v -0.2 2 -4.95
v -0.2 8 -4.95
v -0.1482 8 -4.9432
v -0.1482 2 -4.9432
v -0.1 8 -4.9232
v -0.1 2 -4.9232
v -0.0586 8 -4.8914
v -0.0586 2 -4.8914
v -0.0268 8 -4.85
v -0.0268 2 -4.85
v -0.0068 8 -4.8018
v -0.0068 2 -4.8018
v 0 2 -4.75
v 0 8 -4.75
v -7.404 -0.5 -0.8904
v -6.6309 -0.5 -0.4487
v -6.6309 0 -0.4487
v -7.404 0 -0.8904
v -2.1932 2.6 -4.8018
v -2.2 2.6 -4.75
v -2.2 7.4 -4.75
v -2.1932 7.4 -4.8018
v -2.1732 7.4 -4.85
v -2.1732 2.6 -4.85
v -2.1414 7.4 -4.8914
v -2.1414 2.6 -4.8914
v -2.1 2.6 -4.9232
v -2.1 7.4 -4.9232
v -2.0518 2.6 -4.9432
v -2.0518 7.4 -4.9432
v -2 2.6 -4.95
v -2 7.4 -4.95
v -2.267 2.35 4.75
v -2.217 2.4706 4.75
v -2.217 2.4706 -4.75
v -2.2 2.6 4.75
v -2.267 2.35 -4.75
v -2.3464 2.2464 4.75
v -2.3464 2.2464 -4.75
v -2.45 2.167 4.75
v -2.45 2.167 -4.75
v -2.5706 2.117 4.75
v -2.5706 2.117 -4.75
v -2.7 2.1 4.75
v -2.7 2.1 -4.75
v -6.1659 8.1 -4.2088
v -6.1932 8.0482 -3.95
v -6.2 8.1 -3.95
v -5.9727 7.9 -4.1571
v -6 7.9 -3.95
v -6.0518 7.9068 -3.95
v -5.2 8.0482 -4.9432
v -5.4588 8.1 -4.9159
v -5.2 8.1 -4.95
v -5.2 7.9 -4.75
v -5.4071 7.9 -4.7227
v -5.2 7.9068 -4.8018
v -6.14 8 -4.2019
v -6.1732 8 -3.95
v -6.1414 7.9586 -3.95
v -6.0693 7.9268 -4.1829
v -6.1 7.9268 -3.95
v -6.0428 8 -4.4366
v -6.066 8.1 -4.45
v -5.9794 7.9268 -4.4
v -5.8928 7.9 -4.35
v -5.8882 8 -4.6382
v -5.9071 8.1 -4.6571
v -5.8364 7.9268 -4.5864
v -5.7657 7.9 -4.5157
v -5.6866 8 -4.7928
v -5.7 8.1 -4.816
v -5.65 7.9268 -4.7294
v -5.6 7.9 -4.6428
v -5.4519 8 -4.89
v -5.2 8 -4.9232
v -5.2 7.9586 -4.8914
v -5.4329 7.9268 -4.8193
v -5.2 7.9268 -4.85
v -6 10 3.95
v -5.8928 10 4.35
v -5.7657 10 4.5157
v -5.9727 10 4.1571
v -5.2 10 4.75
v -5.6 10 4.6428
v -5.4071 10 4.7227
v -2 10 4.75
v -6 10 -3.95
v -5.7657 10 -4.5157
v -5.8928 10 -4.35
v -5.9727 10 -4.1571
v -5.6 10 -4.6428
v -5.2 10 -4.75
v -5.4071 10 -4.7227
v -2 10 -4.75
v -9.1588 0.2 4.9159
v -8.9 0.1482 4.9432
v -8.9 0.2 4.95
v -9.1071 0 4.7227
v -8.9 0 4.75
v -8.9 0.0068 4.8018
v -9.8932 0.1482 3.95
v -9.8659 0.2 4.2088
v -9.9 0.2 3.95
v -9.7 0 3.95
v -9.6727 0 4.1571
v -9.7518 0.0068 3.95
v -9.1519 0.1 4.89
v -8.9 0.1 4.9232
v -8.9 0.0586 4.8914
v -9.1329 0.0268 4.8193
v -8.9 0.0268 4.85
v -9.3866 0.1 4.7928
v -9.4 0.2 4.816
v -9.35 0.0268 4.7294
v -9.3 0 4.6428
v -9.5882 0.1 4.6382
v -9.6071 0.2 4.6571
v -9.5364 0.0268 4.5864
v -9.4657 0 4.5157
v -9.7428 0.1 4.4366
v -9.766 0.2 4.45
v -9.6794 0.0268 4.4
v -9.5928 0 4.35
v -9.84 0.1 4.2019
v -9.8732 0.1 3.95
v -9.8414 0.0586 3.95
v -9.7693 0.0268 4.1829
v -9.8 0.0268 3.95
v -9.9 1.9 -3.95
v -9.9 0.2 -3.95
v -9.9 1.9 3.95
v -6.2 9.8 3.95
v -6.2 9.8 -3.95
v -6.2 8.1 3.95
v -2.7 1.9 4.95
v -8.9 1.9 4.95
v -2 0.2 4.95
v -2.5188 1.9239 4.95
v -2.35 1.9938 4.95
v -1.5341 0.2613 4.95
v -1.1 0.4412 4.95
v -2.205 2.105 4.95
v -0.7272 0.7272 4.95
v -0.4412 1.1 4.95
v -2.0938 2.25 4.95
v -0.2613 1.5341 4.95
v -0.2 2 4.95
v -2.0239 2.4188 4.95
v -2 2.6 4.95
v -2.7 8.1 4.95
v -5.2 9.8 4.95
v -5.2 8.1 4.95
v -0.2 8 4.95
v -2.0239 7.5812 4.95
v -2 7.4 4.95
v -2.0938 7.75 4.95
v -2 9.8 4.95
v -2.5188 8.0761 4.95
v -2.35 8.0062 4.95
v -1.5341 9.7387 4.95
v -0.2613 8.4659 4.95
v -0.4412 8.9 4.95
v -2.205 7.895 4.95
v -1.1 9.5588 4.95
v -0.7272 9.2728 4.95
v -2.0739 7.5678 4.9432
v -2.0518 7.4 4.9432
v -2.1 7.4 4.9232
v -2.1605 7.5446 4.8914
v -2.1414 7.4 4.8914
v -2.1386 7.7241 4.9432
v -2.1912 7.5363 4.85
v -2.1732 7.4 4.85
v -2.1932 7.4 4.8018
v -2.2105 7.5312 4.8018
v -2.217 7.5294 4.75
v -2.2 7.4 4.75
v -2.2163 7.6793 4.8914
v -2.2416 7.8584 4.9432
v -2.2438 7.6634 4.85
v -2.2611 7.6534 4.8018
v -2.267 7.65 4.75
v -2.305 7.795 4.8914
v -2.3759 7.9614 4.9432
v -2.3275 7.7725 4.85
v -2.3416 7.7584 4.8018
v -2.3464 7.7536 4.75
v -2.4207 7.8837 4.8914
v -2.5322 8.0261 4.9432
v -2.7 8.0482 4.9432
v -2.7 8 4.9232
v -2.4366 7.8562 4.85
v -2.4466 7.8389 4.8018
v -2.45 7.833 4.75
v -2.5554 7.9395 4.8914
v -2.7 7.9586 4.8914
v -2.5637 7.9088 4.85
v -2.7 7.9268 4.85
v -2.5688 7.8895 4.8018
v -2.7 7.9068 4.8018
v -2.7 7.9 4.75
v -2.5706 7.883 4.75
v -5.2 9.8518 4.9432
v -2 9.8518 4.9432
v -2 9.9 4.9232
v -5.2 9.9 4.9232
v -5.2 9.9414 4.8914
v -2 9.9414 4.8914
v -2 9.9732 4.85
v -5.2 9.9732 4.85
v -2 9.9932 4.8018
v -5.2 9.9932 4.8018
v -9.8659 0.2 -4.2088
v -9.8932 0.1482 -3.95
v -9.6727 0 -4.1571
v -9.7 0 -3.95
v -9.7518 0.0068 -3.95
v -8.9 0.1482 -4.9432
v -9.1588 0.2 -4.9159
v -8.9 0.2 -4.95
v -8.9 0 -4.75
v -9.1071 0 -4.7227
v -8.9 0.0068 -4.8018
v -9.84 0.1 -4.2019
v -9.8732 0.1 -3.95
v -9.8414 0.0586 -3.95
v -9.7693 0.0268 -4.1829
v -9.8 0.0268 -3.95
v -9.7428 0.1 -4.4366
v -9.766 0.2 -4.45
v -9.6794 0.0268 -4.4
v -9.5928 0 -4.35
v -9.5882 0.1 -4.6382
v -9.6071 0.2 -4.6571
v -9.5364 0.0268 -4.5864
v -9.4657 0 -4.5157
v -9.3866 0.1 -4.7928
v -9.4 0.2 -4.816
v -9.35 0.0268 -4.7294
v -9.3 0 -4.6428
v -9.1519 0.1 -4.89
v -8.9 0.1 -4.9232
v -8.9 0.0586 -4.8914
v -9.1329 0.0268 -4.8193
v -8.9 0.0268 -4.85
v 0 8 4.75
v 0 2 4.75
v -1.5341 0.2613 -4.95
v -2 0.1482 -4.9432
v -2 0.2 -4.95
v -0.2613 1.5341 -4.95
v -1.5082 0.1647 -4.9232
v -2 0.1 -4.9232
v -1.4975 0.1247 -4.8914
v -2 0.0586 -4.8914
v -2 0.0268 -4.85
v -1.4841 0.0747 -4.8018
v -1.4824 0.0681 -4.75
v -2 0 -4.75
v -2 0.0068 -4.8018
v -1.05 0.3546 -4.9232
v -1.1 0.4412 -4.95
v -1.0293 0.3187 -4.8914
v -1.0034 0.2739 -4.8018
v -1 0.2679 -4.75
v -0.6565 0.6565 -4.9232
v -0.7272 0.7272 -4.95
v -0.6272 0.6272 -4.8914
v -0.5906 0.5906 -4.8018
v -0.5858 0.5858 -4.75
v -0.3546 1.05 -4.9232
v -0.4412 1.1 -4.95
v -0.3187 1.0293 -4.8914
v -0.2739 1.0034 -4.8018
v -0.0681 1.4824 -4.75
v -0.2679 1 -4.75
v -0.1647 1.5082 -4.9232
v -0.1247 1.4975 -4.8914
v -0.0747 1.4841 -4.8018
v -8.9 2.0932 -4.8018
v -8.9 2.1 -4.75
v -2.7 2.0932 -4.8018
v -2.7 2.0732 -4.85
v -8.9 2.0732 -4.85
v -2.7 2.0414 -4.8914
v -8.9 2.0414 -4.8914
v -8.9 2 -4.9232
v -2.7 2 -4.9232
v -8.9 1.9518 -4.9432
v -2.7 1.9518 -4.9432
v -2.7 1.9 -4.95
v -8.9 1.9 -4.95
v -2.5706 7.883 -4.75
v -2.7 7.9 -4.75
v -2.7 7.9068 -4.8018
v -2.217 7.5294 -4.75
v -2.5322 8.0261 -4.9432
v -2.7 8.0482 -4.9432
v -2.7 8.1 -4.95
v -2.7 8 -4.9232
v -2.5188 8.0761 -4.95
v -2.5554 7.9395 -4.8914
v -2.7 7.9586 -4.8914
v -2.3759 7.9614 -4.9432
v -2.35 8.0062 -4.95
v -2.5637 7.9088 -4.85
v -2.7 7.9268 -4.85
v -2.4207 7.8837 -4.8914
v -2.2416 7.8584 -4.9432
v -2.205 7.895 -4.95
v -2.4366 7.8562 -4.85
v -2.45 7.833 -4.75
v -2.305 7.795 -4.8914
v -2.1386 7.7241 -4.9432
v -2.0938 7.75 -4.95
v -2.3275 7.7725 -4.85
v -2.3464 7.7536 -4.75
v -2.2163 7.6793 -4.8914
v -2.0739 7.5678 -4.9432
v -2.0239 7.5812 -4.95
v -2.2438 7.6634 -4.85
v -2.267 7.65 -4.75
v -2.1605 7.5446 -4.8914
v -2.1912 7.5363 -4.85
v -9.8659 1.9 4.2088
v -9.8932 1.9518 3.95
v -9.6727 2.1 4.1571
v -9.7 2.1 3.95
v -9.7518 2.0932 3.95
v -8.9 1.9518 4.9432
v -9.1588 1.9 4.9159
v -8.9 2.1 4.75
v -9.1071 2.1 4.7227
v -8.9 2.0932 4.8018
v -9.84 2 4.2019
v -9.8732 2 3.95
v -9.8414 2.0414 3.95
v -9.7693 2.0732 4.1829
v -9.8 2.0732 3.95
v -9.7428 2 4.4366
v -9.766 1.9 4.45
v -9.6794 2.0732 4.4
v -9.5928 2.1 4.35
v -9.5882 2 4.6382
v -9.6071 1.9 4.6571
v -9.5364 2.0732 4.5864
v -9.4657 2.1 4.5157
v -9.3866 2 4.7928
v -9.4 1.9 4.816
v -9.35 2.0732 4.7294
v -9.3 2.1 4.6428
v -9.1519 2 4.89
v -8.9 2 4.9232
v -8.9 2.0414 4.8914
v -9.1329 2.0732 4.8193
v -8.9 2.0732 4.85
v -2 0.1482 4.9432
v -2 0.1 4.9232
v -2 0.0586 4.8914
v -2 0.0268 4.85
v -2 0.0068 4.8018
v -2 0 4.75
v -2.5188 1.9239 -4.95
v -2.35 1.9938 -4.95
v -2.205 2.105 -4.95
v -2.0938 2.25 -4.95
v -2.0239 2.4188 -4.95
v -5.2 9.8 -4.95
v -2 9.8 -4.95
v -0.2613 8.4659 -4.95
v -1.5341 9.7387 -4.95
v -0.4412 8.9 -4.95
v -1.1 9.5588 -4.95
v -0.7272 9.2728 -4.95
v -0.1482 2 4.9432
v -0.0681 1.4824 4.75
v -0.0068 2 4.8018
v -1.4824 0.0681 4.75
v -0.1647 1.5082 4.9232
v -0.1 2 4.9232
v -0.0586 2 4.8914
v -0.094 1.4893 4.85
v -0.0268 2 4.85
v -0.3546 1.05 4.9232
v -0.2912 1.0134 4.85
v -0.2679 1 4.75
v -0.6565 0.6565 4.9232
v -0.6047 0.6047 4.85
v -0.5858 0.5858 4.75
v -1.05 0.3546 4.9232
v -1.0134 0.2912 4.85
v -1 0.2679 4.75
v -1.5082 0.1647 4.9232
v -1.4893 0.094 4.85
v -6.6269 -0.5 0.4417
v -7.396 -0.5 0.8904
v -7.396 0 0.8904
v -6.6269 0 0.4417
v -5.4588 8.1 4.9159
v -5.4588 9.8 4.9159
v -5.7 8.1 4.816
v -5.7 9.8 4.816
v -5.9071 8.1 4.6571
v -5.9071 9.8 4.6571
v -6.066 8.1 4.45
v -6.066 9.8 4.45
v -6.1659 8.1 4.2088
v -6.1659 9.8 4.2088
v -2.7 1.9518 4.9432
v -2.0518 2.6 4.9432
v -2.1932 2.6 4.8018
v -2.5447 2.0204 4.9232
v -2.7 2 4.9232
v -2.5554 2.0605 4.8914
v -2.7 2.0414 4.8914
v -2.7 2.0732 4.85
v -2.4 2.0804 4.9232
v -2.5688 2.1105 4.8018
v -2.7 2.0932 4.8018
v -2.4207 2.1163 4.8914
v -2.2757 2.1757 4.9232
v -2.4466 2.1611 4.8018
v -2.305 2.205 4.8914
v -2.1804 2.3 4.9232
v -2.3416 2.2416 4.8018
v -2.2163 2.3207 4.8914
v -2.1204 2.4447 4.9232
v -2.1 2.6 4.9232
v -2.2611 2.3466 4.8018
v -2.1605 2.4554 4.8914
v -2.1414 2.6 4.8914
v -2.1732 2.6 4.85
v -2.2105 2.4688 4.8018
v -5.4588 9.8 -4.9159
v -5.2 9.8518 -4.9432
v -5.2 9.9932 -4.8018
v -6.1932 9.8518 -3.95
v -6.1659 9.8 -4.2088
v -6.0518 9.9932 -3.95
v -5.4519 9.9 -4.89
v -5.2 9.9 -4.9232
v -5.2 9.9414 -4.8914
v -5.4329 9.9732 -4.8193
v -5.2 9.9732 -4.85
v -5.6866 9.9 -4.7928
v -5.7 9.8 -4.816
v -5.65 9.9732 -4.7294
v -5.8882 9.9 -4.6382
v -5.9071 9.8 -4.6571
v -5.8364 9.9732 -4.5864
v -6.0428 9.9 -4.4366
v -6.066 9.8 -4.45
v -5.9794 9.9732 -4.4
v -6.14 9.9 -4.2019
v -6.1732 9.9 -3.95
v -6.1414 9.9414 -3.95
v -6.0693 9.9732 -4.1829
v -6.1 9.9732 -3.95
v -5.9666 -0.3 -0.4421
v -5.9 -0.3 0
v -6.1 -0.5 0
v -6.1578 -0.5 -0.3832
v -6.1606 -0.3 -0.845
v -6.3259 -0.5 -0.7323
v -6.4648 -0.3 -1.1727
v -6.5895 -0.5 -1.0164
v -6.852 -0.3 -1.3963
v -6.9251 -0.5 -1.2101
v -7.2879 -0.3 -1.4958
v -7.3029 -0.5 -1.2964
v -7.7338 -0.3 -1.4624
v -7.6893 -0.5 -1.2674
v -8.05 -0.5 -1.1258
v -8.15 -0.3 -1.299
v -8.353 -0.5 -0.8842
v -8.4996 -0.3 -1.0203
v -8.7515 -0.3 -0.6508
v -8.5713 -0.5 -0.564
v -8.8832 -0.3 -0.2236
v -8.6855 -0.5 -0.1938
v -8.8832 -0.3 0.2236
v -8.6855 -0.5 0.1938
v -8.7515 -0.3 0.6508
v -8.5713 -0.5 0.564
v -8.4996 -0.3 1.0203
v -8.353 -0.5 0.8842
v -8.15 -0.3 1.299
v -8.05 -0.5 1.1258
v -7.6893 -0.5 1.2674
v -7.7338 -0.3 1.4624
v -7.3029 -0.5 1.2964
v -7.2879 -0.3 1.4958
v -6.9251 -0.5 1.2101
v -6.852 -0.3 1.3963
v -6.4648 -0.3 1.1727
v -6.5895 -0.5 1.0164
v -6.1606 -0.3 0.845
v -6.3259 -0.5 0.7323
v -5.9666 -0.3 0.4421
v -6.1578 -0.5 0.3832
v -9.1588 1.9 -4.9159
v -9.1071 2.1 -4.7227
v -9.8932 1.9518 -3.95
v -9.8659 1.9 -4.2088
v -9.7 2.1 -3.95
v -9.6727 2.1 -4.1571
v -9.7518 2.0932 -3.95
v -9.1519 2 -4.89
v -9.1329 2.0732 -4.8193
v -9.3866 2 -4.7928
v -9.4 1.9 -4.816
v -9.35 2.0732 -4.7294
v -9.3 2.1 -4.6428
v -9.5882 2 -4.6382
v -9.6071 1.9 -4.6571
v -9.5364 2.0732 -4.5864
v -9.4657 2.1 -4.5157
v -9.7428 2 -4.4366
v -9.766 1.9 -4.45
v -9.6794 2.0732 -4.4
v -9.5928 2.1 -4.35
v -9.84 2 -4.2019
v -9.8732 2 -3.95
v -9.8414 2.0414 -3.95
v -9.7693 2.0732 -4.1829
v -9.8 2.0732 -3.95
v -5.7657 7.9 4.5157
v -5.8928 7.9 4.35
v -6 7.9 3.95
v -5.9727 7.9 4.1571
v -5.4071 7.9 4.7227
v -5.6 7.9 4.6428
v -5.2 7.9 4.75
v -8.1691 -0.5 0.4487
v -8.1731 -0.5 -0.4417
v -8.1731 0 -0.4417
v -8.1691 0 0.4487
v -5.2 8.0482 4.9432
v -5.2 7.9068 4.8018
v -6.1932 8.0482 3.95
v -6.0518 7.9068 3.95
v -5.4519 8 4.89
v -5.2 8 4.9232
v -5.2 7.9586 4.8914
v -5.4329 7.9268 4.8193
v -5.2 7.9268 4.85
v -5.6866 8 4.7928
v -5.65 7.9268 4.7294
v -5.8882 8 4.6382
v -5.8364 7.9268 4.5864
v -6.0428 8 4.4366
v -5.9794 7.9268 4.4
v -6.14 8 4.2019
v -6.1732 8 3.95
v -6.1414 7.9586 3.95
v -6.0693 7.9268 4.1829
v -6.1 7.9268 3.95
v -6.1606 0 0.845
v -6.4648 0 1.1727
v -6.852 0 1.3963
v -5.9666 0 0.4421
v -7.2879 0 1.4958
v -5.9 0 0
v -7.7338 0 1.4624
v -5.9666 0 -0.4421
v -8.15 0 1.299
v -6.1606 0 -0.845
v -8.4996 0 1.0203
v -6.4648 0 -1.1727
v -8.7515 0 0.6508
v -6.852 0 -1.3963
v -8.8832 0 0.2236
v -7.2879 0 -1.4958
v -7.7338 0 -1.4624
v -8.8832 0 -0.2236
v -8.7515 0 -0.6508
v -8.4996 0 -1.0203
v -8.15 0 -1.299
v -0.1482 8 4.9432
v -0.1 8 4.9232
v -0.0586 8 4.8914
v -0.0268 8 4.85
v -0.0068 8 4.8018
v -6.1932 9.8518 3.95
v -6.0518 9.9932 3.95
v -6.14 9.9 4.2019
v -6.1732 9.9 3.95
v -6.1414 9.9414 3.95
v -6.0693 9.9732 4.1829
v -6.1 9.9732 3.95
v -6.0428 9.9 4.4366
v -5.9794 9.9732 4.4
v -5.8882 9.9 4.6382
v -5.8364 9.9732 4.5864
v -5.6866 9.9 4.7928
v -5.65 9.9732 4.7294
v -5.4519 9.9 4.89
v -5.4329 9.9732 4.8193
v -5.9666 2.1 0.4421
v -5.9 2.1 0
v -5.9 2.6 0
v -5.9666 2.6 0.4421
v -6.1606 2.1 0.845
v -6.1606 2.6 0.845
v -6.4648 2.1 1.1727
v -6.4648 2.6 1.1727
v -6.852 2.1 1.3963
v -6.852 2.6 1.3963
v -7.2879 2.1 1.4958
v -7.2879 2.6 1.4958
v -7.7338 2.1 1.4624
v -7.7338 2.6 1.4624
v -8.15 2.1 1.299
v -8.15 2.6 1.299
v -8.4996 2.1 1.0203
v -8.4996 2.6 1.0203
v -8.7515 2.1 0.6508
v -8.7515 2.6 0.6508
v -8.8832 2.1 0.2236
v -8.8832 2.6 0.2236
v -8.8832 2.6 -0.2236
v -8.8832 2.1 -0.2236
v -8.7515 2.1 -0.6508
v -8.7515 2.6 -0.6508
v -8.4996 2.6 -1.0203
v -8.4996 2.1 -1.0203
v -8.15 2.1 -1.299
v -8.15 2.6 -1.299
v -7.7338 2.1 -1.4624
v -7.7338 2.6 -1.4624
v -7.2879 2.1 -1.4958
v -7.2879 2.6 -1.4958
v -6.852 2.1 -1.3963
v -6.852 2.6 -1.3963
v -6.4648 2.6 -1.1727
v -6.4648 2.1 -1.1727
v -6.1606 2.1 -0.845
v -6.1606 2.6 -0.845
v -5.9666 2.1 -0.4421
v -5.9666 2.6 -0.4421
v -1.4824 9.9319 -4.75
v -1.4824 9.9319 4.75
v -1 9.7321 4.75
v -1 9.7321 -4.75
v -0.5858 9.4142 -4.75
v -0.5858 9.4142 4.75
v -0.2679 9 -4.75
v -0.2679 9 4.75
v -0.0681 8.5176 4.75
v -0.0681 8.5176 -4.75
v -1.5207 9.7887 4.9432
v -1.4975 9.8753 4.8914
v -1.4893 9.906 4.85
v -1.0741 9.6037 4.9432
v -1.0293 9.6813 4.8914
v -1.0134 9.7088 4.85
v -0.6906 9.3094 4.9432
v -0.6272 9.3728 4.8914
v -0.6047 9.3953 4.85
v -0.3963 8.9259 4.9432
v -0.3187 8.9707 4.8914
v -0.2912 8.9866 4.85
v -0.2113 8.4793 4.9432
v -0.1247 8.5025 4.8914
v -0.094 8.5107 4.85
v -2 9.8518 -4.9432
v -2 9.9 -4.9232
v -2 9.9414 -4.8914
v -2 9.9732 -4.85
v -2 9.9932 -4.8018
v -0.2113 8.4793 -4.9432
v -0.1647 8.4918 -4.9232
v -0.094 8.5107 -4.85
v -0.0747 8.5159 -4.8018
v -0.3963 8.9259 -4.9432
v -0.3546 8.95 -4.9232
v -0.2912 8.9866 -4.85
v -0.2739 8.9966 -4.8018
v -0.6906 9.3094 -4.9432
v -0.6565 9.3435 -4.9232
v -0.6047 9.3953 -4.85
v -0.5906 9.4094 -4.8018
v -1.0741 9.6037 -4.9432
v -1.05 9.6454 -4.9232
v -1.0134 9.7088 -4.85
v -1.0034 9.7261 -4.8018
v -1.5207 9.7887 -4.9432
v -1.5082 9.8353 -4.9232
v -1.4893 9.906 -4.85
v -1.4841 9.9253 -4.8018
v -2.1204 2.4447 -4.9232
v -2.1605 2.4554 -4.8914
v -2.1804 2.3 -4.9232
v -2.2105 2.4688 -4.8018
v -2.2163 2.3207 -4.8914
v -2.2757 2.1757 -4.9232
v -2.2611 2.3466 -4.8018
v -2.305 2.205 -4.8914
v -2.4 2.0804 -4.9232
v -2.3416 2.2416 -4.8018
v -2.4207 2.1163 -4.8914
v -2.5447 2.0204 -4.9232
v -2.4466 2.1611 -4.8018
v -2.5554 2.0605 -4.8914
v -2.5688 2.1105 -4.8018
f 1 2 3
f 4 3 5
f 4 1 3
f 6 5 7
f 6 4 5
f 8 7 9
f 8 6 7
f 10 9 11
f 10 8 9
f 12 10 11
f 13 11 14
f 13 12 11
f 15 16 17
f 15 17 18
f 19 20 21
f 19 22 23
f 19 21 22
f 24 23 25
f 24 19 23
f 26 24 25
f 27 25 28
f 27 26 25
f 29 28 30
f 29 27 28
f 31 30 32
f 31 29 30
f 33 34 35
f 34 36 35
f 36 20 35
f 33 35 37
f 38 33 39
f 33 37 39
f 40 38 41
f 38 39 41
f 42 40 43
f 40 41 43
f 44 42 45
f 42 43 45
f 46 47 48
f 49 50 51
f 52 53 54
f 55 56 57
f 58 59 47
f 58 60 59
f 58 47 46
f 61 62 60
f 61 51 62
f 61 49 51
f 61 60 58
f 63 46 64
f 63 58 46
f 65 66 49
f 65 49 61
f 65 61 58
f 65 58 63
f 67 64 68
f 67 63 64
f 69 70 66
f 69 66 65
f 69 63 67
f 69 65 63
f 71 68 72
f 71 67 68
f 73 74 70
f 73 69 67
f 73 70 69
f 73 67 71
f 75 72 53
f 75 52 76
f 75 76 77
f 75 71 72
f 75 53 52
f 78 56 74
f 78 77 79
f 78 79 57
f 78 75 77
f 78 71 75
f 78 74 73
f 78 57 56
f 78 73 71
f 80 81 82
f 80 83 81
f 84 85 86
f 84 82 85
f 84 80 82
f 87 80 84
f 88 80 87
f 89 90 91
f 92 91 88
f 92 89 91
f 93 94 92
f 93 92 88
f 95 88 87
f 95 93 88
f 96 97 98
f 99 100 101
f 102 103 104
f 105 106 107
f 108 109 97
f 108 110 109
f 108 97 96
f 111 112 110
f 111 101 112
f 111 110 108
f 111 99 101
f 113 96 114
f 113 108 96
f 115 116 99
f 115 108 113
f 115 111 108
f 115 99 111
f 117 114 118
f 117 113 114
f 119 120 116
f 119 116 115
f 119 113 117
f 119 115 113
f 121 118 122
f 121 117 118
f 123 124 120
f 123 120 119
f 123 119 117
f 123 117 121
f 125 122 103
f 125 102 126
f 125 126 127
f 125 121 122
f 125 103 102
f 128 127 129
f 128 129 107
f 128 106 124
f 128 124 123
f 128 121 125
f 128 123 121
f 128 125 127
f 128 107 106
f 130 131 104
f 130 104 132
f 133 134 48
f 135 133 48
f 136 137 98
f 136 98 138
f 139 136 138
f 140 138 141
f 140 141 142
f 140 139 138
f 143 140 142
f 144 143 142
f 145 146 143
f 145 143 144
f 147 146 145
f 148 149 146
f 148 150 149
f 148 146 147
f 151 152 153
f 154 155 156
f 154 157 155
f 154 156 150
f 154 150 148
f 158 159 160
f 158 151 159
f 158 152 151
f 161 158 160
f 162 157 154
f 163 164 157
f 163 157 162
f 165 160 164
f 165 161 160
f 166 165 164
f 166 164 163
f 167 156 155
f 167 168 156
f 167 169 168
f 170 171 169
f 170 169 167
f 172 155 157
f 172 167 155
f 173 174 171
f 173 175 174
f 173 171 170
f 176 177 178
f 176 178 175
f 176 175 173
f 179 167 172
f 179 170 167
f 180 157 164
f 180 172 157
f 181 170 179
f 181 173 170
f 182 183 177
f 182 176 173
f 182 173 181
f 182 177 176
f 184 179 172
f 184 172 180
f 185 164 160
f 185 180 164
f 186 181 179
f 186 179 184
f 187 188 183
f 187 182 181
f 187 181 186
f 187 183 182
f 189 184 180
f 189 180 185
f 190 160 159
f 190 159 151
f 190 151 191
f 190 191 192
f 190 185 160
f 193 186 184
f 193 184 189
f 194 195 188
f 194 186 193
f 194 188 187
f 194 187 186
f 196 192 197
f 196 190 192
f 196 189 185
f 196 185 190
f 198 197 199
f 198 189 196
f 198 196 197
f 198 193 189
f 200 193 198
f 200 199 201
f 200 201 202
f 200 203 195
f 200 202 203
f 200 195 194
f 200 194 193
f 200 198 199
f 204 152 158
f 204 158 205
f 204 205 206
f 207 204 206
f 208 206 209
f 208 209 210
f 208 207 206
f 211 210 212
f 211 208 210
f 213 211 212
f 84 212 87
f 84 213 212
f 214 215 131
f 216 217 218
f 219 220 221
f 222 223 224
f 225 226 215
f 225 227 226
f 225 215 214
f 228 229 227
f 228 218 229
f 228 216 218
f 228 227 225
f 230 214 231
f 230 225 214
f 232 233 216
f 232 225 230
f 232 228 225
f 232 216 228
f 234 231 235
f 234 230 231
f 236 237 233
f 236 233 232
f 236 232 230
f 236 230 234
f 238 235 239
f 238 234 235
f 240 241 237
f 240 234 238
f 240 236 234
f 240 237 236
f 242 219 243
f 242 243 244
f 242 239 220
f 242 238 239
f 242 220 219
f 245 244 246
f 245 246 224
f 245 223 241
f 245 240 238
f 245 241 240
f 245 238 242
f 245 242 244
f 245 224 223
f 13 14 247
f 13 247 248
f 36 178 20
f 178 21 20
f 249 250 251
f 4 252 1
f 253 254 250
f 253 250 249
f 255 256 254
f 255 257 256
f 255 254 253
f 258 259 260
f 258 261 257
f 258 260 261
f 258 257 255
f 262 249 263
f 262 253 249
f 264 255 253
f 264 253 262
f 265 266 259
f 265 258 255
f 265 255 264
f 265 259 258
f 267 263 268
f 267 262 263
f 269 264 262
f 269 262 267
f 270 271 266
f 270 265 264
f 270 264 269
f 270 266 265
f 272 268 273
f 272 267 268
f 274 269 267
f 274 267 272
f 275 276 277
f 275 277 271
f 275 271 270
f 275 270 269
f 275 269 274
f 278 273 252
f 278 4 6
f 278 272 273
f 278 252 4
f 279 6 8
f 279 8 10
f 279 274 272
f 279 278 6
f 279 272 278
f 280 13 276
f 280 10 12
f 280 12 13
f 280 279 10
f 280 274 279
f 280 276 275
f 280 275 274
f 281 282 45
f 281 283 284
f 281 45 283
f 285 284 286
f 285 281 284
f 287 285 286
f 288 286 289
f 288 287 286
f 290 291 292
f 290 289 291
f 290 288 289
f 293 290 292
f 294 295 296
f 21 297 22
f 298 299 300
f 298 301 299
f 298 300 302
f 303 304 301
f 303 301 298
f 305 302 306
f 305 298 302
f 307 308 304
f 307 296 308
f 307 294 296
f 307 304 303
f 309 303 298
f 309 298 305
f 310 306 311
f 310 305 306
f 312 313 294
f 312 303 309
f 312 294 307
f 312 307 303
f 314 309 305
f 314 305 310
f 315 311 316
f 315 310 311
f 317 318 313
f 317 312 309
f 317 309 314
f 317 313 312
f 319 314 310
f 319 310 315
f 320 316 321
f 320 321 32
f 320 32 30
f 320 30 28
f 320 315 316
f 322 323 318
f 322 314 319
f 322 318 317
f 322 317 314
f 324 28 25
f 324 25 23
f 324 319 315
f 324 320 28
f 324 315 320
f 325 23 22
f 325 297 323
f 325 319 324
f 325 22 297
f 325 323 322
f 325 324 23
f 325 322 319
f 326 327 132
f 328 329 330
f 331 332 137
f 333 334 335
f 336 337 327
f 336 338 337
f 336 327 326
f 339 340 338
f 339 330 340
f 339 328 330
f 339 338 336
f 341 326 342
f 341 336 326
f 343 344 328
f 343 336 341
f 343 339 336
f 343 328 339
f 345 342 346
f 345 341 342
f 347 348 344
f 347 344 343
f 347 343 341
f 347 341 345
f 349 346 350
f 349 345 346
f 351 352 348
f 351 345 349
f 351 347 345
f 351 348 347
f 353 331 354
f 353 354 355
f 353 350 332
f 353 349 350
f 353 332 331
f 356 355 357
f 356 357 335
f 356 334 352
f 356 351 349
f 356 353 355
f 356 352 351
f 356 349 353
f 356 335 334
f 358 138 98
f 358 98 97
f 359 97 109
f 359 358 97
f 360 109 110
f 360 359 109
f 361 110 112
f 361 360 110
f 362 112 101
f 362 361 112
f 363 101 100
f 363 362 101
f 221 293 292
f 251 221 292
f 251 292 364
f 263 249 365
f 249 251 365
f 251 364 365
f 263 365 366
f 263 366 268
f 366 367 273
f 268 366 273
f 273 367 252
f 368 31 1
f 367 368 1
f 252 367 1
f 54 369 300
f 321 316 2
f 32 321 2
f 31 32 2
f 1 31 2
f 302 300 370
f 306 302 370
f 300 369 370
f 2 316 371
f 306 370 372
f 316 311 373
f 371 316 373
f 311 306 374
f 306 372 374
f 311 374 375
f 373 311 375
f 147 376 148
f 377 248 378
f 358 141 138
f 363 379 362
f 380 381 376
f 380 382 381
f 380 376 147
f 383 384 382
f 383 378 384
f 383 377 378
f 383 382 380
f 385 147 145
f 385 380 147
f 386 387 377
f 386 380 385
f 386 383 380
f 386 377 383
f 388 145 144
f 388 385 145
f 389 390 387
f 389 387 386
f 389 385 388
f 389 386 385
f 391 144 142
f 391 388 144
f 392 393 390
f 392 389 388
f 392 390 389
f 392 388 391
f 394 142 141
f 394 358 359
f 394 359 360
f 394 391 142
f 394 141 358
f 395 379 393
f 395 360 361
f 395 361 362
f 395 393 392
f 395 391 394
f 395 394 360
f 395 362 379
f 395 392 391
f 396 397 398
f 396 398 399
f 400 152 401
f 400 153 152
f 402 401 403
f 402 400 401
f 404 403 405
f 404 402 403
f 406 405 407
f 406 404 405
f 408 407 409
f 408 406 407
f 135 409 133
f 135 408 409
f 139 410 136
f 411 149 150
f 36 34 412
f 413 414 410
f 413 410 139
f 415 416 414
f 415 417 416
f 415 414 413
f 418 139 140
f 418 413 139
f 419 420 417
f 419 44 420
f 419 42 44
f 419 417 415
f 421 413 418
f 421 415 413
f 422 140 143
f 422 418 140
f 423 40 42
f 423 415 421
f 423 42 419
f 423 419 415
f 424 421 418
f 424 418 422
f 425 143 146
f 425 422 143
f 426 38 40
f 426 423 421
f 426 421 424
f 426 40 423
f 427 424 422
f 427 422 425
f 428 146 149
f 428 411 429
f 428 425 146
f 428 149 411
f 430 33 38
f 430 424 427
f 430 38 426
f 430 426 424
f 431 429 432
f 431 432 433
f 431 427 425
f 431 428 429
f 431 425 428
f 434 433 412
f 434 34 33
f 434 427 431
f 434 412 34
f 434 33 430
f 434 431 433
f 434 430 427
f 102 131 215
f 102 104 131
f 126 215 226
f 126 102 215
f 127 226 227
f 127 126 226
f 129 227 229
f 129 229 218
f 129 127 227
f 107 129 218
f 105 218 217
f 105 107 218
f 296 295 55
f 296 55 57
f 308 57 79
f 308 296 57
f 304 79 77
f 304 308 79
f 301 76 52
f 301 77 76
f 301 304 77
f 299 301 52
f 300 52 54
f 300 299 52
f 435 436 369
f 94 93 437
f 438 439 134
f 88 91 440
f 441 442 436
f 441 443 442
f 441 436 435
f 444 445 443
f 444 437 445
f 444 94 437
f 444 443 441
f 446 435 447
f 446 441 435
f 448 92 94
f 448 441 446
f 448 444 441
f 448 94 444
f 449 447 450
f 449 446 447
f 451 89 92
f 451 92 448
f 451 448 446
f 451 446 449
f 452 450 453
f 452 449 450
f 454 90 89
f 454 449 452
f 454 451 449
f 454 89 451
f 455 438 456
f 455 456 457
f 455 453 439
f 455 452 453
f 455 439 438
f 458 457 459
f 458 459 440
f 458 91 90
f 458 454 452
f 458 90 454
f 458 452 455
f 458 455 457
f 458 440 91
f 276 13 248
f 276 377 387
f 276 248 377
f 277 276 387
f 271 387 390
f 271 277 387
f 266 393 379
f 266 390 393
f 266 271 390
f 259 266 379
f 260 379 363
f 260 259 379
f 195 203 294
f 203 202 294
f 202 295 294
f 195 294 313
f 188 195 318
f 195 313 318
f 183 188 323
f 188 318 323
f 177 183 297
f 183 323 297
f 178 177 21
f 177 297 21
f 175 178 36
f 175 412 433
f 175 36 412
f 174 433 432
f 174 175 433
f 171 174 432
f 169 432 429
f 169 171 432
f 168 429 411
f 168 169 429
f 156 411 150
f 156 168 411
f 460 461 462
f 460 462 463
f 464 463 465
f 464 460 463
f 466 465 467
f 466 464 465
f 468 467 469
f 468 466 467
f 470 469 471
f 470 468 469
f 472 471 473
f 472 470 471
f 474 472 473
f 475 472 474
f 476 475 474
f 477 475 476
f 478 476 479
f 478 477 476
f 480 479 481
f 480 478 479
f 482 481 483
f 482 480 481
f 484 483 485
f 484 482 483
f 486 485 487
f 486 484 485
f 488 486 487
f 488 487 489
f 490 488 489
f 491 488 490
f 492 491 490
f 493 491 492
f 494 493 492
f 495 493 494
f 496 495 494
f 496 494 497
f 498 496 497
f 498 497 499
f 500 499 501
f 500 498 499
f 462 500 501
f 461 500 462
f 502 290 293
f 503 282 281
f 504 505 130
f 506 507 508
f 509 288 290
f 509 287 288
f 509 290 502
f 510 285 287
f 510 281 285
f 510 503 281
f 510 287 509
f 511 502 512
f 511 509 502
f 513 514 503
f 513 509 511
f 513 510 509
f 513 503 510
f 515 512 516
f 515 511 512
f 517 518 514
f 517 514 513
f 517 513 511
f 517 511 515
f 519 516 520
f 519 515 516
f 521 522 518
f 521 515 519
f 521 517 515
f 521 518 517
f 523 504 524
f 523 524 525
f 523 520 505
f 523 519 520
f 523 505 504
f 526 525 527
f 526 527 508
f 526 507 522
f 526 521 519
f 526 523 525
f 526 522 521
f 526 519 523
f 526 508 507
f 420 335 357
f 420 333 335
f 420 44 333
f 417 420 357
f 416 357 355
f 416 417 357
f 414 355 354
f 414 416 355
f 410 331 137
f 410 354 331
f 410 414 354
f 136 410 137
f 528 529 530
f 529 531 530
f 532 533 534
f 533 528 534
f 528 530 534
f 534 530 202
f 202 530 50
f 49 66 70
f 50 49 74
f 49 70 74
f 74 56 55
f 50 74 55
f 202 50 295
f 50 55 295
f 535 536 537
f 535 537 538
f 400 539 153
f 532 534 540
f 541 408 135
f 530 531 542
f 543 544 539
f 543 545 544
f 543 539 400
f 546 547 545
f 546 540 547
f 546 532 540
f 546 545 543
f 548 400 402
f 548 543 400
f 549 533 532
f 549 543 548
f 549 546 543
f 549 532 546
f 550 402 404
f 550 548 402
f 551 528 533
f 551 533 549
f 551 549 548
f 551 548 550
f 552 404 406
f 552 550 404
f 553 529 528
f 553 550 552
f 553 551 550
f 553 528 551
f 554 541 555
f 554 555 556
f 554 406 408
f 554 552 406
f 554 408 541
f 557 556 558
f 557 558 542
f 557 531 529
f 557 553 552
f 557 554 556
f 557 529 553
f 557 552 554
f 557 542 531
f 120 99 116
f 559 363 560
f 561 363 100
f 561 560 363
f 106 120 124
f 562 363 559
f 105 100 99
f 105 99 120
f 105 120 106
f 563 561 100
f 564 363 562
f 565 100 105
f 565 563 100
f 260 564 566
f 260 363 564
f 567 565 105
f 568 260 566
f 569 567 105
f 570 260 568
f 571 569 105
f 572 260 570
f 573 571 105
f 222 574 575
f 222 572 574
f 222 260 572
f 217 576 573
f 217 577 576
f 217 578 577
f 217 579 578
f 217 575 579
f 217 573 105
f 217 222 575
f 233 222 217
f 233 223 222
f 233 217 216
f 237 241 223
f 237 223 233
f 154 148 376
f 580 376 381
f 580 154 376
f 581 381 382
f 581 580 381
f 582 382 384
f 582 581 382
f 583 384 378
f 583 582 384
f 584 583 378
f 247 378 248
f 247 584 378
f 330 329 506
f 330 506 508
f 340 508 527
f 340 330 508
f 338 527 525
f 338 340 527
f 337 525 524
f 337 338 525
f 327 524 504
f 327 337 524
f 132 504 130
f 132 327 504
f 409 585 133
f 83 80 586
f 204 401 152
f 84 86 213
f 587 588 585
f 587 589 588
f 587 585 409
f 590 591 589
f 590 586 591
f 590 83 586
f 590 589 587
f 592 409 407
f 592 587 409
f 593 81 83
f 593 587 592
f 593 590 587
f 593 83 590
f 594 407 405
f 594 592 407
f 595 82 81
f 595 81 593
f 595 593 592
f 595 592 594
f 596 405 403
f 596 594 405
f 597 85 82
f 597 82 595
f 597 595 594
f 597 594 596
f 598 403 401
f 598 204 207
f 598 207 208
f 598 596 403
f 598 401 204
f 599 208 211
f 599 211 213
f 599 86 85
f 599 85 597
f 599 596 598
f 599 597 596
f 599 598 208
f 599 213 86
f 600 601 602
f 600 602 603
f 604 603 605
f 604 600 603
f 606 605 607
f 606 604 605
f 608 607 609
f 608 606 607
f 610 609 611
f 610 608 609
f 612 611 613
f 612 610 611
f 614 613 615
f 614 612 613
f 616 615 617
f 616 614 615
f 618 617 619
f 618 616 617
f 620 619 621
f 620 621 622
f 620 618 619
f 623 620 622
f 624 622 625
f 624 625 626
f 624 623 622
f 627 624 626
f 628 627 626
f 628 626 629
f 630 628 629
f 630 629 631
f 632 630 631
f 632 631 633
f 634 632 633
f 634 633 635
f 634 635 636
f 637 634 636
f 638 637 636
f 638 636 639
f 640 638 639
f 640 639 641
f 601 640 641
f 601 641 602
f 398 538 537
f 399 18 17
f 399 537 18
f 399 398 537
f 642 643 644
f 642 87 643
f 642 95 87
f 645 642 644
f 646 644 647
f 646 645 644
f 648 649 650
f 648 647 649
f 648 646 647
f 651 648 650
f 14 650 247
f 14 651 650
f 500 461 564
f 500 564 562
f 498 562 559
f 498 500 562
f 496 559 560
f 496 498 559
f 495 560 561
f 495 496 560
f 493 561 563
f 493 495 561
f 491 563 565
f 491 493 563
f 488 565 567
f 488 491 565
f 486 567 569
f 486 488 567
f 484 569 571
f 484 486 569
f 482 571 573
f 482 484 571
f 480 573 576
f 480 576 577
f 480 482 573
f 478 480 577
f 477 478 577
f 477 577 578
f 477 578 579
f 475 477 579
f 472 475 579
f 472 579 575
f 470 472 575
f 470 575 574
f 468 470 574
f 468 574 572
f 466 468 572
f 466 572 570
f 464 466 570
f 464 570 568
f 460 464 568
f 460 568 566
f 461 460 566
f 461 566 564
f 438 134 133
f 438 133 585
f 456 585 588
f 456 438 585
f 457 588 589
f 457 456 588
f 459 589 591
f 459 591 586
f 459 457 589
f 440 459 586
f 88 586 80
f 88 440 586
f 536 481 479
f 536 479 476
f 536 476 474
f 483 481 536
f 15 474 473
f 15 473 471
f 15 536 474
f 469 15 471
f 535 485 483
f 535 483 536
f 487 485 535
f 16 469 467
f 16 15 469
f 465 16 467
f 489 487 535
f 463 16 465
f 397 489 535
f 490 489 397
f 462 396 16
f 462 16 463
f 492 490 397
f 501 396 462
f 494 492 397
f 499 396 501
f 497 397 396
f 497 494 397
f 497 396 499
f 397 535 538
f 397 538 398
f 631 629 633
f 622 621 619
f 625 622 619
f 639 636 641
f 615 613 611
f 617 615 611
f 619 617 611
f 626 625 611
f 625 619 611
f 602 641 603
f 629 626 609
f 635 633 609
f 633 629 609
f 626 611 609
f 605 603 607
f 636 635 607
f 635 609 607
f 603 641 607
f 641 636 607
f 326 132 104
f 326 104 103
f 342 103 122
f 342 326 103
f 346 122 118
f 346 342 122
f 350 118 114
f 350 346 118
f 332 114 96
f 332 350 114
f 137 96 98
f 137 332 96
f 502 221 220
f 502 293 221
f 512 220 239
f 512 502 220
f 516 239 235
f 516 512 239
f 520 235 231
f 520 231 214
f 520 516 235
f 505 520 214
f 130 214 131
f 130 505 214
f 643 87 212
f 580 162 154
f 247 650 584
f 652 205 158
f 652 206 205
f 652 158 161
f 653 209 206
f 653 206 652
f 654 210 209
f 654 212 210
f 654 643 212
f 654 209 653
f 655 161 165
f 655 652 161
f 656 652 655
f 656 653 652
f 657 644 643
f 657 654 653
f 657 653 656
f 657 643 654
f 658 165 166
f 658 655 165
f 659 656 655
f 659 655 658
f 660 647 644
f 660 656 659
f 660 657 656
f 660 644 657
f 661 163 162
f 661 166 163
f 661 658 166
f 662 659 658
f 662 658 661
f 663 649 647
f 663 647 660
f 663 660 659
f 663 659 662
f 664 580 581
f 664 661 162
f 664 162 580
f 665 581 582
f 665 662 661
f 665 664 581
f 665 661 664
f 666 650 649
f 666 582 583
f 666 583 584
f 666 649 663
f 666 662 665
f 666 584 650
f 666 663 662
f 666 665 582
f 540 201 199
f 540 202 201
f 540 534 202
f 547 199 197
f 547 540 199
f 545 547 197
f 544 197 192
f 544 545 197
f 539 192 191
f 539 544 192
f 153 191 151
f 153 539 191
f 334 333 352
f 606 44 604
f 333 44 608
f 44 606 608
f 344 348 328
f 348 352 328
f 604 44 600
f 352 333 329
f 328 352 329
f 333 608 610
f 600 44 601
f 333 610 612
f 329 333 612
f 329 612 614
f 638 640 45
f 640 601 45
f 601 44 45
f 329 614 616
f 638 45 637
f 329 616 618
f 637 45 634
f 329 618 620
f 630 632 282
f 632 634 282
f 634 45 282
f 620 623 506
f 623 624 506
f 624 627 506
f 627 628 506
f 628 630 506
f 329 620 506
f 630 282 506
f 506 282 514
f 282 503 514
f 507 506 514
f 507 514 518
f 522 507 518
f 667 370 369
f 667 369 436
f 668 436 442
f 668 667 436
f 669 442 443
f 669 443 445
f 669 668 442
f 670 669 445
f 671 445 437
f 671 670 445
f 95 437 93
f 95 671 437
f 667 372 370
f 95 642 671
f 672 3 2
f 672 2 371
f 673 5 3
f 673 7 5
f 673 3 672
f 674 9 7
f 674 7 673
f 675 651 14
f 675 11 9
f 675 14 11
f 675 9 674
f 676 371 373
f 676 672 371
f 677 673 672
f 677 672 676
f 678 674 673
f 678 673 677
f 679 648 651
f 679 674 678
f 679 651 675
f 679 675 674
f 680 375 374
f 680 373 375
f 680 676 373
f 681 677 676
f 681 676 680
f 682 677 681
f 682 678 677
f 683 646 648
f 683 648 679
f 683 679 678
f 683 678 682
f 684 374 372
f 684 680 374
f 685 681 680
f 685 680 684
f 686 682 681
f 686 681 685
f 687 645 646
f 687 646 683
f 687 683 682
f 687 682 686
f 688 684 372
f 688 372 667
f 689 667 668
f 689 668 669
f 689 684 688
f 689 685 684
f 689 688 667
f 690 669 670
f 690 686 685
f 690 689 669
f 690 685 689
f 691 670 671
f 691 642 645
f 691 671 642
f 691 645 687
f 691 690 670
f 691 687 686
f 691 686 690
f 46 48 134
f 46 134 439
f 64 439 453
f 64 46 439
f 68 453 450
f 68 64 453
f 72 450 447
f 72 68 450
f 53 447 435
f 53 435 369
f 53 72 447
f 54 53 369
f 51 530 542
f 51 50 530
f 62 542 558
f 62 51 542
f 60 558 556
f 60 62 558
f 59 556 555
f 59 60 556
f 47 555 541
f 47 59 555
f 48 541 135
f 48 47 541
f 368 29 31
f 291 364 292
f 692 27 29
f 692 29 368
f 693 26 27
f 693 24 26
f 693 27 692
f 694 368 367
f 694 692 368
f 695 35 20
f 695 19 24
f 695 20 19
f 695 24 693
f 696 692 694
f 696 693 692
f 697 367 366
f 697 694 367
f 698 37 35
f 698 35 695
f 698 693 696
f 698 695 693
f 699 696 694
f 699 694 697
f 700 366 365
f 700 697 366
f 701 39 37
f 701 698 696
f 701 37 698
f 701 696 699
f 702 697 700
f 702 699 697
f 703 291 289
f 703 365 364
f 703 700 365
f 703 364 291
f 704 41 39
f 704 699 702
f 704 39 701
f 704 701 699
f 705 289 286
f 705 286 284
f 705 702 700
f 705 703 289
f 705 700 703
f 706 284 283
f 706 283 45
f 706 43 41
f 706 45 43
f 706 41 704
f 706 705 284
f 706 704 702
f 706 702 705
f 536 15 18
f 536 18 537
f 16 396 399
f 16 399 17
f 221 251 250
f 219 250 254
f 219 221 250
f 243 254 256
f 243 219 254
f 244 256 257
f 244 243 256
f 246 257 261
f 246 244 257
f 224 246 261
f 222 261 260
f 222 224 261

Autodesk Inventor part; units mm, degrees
ref_plane "YZ Plane" through (0, 0, 0) normal (1, 0, 0) x (0, 1, 0)
ref_plane "XZ Plane" through (0, 0, 0) normal (0, 1, 0) x (-1, 0, 0)
ref_plane "XY Plane" through (0, 0, 0) normal (0, 0, 1) x (1, 0, 0)
sketch "Эскиз1" plane through (0, 0, 0) normal (0, 0, 1) x (1, 0, 0)
  line L0 (-2, 0) -> (-9.9, 0)
  line L1 (-6.2, 10) -> (-2, 10)
  line L2 (0, 8) -> (0, 2)
  line L3 (-6.2, 7.9) -> (-2.7, 7.9)
  line L4 (-2.2, 7.4) -> (-2.2, 2.6)
  line L5 (-2.7, 2.1) -> (-9.9, 2.1)
  line L6 (0, 5) -> (-10, 5) construction
  line L7 (-6.2, 10) -> (-6.2, 7.9)
  line L8 (-9.9, 0) -> (-9.9, 2.1)
  arc A0 (0, 8) -> (-2, 10) centre (-2, 8) ccw
  arc A1 (-2, 0) -> (0, 2) centre (-2, 2) ccw
  arc A2 (-2.2, 7.4) -> (-2.7, 7.9) centre (-2.7, 7.4) ccw
  arc A3 (-2.7, 2.1) -> (-2.2, 2.6) centre (-2.7, 2.6) ccw
  point P0 (0, 0)
  dimension "d0" = 10
  dimension "d1" = 5.8
  dimension "d2" = 2.1
  dimension "d3" = 2.2
  dimension "d5" = 6.2
  dimension "d6" = 9.9
  dimension "d7" = 2
  dimension "d8" = 2.1
  dimension "d9" = 0.5
extrude "Выдавливание1" add sketch "Эскиз1" along normal mid plane 9.9
fillet "Сопряжение1" radius 1 4 edges at (-6.2, 8.95, 4.95) (-6.2, 8.95, -4.95) (-9.9, 1.05, 4.95) (-9.9, 1.05, -4.95)
fillet "Сопряжение2" radius 0.2 32 edges at (-9.6071, 2.1, 4.6571) (-9.9, 2.1, 0) (-9.6071, 2.1, -4.6571) (-5.8, 2.1, -4.95) (-2.3464, 2.2464, -4.95) (-2.2, 5, -4.95) (-2.3464, 7.7536, -4.95) (-3.95, 7.9, -4.95) (-5.9071, 7.9, -4.6571) (-6.2, 7.9, 0) (-5.9071, 7.9, 4.6571) (-3.95, 7.9, 4.95) (-2.3464, 7.7536, 4.95) (-2.2, 5, 4.95) (-2.3464, 2.2464, 4.95) (-5.8, 2.1, 4.95) (-0.5858, 0.5858, 4.95) (0, 5, 4.95) (-0.5858, 9.4142, 4.95) (-3.6, 10, 4.95) (-5.9071, 10, 4.6571) (-6.2, 10, 0) (-5.9071, 10, -4.6571) (-3.6, 10, -4.95) (-0.5858, 9.4142, -4.95) (0, 5, -4.95) (-0.5858, 0.5858, -4.95) (-5.45, 0, -4.95) (-9.6071, 0, -4.6571) (-9.9, 0, 0) (-9.6071, 0, 4.6571) (-5.45, 0, 4.95)
sketch "Эскиз2" plane through (-8.9, 0, -4.75) normal (0, -1, 0) x (1, 0, 0)
  line L0 (-1, 8.7) -> (-1, 0.8) construction
  line L1 (-1, 4.75) -> (9.4252, 4.75) construction
  circle A0 centre (1.5, 4.75) radius 1.5
  point P0 (8.9, 4.75)
  dimension "d14" = 3
  dimension "d15" = 2.5
extrude "Выдавливание2" add sketch "Эскиз2" against normal blind 2.6 and the other way blind 0.5
chamfer "Фаска1" distance 0.2 angle 45 1 edges at (-8.9, -0.5, 0)
sketch "Эскиз3" plane through (-7.4, -0.5, 0) normal (0, -1, 0) x (1, 0, 0)
  line L0 (0.004, 0.8904) -> (0.7731, 0.4417)
  line L1 (0.7731, 0.4417) -> (0.7691, -0.4487)
  line L2 (0.7691, -0.4487) -> (-0.004, -0.8904)
  line L3 (-0.004, -0.8904) -> (-0.7731, -0.4417)
  line L4 (-0.7731, -0.4417) -> (-0.7691, 0.4487)
  line L5 (-0.7691, 0.4487) -> (0.004, 0.8904)
  point P0 (7.4, 0)
  point P1 (0, 0)
extrude "Выдавливание3" cut sketch "Эскиз3" against normal blind 0.5
properties part number "скоба"
